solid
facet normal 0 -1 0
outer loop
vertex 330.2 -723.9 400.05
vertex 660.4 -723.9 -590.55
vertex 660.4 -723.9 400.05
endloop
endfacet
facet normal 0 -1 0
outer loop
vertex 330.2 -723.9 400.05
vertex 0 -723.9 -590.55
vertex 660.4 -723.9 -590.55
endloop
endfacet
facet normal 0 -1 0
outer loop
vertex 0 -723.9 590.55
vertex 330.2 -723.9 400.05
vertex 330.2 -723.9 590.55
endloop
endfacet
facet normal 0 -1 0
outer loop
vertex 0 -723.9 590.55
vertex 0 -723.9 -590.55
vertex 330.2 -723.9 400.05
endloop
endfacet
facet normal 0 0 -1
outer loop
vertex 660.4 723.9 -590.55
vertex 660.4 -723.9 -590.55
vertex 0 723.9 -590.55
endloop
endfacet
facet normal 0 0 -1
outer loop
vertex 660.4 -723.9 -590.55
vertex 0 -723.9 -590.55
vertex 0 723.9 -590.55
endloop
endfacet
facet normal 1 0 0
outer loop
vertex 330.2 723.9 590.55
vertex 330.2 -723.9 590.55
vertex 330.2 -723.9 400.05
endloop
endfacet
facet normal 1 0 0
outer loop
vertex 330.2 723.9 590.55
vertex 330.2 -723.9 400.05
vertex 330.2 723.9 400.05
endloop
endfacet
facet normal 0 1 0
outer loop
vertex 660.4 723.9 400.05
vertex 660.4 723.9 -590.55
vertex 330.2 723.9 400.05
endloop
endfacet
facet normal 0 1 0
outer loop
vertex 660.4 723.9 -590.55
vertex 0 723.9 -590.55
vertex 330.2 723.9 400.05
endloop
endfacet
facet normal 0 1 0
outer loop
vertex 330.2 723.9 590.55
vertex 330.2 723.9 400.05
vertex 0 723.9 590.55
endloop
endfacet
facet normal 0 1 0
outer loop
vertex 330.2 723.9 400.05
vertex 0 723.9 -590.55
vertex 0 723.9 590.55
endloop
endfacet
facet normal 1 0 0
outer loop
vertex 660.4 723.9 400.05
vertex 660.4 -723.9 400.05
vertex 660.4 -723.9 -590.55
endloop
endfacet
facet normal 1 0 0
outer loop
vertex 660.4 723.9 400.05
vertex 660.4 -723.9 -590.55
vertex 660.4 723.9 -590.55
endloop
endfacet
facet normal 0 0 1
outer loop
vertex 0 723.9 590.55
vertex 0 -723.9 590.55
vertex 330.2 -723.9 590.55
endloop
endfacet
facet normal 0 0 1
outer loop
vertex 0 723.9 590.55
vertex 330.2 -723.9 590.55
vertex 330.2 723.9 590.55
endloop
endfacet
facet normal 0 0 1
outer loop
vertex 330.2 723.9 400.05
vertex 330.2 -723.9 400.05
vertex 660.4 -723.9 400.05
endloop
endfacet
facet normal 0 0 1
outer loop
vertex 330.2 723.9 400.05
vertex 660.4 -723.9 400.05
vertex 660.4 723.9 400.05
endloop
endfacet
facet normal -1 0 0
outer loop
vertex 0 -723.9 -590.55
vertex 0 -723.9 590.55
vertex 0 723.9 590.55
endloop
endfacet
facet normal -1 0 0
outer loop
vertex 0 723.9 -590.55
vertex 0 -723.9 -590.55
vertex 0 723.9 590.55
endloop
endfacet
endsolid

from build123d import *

# Parameters (mm, degrees)
F0_W     = 1447.8
F0_H     = 1181.1
F1_DEPTH = 330.2
F2_W     = 1447.8
F2_H     = 990.6
F3_DEPTH = 330.2


with BuildPart() as f1:
    # F0 (on Right) → F1 (new body)
    with BuildSketch(Plane.YZ):
        Rectangle(F0_W, F0_H)
    extrude(amount=F1_DEPTH)

    # F2 (on face) → F3 (join)
    with BuildSketch(Plane.YZ.offset(330.2)):
        with Locations((0, -95.25)):
            Rectangle(F2_W, F2_H)
    extrude(amount=F3_DEPTH)


solid = f1.part
